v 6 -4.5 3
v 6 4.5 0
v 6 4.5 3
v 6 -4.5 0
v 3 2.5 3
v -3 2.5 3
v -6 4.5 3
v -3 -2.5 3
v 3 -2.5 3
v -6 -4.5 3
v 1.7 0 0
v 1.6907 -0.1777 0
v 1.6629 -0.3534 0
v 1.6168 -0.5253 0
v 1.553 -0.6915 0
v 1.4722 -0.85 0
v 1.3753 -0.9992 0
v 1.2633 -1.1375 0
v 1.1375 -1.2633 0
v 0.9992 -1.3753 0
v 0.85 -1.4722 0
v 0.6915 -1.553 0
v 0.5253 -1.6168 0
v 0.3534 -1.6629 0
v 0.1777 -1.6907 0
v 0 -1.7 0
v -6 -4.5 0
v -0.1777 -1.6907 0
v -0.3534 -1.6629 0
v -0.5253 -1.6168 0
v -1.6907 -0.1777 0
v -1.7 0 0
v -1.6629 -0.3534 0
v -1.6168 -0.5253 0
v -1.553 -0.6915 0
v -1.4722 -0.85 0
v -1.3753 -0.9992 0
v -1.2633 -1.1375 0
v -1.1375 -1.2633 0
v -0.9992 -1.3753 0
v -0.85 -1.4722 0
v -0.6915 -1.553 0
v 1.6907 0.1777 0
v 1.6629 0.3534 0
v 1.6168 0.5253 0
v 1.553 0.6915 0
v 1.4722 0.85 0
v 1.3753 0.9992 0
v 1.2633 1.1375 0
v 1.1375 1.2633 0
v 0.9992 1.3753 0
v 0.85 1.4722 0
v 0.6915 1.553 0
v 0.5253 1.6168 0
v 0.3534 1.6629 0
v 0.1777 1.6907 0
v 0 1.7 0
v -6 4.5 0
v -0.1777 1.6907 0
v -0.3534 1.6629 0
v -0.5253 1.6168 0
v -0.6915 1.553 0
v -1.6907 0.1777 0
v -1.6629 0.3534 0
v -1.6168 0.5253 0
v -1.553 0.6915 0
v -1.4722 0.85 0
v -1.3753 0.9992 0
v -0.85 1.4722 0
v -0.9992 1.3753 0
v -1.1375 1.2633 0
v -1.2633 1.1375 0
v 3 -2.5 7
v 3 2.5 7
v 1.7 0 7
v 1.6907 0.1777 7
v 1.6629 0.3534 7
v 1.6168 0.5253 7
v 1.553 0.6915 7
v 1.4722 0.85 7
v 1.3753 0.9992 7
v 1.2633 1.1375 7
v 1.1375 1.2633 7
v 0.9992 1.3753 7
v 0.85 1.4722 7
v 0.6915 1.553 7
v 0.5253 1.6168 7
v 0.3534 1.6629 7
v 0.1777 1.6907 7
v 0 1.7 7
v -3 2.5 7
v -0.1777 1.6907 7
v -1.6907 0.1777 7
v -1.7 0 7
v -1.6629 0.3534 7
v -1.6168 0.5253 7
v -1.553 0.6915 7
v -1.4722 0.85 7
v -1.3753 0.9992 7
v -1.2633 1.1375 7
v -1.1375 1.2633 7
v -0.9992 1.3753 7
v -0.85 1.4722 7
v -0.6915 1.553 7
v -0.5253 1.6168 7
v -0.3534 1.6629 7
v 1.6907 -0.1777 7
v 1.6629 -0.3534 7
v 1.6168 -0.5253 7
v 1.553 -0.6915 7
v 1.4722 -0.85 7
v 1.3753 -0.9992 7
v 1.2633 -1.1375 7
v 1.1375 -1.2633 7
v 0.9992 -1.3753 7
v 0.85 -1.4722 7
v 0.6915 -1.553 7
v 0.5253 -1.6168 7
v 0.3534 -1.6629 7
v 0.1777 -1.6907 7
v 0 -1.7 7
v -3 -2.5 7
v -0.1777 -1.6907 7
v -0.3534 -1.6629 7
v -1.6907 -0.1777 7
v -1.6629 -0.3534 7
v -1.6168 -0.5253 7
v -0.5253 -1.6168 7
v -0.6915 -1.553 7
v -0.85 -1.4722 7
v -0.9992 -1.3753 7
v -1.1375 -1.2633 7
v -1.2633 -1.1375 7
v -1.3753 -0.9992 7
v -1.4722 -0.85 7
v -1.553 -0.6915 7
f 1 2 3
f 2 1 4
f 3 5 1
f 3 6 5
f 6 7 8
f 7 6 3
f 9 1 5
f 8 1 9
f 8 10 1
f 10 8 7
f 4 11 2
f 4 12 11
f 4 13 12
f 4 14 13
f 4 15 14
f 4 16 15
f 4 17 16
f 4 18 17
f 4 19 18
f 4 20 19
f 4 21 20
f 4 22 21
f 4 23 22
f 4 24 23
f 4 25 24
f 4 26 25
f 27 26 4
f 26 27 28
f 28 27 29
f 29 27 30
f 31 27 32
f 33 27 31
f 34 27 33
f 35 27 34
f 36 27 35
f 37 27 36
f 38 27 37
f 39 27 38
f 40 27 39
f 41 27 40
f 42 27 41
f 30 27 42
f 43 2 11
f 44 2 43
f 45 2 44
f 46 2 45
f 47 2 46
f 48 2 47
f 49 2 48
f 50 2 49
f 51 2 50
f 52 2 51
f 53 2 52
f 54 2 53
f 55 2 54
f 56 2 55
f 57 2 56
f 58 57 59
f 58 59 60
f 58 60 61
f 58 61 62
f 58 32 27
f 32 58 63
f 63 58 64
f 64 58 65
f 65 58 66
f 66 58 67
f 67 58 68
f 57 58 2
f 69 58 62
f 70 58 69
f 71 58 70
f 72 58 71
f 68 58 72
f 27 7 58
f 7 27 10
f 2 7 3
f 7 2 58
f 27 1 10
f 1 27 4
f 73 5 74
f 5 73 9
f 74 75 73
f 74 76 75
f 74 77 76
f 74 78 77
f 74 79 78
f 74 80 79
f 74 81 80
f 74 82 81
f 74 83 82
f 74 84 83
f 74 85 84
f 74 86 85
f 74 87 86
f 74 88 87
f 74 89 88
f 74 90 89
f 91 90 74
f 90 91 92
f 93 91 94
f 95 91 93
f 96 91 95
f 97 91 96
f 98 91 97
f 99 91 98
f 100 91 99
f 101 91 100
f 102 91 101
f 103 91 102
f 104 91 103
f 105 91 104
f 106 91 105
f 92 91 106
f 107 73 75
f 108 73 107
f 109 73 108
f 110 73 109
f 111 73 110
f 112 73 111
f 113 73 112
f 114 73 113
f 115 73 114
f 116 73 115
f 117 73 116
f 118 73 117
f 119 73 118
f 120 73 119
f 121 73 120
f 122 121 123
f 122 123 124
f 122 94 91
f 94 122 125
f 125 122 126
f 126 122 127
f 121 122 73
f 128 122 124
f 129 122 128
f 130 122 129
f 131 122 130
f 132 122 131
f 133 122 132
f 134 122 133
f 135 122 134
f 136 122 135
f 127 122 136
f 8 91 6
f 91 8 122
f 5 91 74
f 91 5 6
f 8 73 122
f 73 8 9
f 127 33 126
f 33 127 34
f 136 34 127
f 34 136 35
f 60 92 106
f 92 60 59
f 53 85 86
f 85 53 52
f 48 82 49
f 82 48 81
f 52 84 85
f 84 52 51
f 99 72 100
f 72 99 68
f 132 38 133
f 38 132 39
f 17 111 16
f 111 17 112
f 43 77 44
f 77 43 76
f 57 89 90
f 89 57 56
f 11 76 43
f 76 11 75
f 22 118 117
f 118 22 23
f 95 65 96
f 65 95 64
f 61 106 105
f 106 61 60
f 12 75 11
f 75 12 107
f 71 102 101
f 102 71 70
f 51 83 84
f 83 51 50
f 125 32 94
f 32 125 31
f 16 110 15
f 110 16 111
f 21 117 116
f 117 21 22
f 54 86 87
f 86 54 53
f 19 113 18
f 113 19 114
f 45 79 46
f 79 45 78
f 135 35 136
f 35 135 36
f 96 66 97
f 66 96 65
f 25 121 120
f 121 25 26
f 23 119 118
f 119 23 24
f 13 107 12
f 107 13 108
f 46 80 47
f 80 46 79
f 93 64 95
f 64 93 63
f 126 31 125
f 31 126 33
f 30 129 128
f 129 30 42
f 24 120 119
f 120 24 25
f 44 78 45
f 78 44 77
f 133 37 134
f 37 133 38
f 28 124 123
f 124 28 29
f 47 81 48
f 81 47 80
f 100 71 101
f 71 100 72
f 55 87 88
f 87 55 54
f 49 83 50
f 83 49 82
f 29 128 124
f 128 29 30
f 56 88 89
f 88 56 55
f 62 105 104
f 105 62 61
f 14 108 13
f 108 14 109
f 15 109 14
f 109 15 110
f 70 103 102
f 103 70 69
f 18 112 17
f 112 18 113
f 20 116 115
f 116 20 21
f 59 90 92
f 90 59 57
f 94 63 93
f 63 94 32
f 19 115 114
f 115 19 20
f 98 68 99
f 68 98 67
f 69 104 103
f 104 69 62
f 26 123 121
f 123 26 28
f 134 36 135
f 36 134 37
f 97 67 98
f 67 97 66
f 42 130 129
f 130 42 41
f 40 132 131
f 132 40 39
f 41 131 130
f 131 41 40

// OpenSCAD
// T-slot nut for aluminium extrusion.
$fn = 60;
eps = 0.02;
slot_w = 5;
thread_d = 3.4;
length = 12;
body_w = slot_w + 4;
body_h = 7;
difference() {
    union() {
        translate([-length / 2, -body_w / 2, 0]) cube([length, body_w, 3]);
        translate([-length / 2 + 3, -slot_w / 2, 3]) cube([length - 6, slot_w, body_h - 3]);
    }
    translate([0, 0, -eps]) cylinder(d = thread_d, h = body_h + 2 * eps);
}
